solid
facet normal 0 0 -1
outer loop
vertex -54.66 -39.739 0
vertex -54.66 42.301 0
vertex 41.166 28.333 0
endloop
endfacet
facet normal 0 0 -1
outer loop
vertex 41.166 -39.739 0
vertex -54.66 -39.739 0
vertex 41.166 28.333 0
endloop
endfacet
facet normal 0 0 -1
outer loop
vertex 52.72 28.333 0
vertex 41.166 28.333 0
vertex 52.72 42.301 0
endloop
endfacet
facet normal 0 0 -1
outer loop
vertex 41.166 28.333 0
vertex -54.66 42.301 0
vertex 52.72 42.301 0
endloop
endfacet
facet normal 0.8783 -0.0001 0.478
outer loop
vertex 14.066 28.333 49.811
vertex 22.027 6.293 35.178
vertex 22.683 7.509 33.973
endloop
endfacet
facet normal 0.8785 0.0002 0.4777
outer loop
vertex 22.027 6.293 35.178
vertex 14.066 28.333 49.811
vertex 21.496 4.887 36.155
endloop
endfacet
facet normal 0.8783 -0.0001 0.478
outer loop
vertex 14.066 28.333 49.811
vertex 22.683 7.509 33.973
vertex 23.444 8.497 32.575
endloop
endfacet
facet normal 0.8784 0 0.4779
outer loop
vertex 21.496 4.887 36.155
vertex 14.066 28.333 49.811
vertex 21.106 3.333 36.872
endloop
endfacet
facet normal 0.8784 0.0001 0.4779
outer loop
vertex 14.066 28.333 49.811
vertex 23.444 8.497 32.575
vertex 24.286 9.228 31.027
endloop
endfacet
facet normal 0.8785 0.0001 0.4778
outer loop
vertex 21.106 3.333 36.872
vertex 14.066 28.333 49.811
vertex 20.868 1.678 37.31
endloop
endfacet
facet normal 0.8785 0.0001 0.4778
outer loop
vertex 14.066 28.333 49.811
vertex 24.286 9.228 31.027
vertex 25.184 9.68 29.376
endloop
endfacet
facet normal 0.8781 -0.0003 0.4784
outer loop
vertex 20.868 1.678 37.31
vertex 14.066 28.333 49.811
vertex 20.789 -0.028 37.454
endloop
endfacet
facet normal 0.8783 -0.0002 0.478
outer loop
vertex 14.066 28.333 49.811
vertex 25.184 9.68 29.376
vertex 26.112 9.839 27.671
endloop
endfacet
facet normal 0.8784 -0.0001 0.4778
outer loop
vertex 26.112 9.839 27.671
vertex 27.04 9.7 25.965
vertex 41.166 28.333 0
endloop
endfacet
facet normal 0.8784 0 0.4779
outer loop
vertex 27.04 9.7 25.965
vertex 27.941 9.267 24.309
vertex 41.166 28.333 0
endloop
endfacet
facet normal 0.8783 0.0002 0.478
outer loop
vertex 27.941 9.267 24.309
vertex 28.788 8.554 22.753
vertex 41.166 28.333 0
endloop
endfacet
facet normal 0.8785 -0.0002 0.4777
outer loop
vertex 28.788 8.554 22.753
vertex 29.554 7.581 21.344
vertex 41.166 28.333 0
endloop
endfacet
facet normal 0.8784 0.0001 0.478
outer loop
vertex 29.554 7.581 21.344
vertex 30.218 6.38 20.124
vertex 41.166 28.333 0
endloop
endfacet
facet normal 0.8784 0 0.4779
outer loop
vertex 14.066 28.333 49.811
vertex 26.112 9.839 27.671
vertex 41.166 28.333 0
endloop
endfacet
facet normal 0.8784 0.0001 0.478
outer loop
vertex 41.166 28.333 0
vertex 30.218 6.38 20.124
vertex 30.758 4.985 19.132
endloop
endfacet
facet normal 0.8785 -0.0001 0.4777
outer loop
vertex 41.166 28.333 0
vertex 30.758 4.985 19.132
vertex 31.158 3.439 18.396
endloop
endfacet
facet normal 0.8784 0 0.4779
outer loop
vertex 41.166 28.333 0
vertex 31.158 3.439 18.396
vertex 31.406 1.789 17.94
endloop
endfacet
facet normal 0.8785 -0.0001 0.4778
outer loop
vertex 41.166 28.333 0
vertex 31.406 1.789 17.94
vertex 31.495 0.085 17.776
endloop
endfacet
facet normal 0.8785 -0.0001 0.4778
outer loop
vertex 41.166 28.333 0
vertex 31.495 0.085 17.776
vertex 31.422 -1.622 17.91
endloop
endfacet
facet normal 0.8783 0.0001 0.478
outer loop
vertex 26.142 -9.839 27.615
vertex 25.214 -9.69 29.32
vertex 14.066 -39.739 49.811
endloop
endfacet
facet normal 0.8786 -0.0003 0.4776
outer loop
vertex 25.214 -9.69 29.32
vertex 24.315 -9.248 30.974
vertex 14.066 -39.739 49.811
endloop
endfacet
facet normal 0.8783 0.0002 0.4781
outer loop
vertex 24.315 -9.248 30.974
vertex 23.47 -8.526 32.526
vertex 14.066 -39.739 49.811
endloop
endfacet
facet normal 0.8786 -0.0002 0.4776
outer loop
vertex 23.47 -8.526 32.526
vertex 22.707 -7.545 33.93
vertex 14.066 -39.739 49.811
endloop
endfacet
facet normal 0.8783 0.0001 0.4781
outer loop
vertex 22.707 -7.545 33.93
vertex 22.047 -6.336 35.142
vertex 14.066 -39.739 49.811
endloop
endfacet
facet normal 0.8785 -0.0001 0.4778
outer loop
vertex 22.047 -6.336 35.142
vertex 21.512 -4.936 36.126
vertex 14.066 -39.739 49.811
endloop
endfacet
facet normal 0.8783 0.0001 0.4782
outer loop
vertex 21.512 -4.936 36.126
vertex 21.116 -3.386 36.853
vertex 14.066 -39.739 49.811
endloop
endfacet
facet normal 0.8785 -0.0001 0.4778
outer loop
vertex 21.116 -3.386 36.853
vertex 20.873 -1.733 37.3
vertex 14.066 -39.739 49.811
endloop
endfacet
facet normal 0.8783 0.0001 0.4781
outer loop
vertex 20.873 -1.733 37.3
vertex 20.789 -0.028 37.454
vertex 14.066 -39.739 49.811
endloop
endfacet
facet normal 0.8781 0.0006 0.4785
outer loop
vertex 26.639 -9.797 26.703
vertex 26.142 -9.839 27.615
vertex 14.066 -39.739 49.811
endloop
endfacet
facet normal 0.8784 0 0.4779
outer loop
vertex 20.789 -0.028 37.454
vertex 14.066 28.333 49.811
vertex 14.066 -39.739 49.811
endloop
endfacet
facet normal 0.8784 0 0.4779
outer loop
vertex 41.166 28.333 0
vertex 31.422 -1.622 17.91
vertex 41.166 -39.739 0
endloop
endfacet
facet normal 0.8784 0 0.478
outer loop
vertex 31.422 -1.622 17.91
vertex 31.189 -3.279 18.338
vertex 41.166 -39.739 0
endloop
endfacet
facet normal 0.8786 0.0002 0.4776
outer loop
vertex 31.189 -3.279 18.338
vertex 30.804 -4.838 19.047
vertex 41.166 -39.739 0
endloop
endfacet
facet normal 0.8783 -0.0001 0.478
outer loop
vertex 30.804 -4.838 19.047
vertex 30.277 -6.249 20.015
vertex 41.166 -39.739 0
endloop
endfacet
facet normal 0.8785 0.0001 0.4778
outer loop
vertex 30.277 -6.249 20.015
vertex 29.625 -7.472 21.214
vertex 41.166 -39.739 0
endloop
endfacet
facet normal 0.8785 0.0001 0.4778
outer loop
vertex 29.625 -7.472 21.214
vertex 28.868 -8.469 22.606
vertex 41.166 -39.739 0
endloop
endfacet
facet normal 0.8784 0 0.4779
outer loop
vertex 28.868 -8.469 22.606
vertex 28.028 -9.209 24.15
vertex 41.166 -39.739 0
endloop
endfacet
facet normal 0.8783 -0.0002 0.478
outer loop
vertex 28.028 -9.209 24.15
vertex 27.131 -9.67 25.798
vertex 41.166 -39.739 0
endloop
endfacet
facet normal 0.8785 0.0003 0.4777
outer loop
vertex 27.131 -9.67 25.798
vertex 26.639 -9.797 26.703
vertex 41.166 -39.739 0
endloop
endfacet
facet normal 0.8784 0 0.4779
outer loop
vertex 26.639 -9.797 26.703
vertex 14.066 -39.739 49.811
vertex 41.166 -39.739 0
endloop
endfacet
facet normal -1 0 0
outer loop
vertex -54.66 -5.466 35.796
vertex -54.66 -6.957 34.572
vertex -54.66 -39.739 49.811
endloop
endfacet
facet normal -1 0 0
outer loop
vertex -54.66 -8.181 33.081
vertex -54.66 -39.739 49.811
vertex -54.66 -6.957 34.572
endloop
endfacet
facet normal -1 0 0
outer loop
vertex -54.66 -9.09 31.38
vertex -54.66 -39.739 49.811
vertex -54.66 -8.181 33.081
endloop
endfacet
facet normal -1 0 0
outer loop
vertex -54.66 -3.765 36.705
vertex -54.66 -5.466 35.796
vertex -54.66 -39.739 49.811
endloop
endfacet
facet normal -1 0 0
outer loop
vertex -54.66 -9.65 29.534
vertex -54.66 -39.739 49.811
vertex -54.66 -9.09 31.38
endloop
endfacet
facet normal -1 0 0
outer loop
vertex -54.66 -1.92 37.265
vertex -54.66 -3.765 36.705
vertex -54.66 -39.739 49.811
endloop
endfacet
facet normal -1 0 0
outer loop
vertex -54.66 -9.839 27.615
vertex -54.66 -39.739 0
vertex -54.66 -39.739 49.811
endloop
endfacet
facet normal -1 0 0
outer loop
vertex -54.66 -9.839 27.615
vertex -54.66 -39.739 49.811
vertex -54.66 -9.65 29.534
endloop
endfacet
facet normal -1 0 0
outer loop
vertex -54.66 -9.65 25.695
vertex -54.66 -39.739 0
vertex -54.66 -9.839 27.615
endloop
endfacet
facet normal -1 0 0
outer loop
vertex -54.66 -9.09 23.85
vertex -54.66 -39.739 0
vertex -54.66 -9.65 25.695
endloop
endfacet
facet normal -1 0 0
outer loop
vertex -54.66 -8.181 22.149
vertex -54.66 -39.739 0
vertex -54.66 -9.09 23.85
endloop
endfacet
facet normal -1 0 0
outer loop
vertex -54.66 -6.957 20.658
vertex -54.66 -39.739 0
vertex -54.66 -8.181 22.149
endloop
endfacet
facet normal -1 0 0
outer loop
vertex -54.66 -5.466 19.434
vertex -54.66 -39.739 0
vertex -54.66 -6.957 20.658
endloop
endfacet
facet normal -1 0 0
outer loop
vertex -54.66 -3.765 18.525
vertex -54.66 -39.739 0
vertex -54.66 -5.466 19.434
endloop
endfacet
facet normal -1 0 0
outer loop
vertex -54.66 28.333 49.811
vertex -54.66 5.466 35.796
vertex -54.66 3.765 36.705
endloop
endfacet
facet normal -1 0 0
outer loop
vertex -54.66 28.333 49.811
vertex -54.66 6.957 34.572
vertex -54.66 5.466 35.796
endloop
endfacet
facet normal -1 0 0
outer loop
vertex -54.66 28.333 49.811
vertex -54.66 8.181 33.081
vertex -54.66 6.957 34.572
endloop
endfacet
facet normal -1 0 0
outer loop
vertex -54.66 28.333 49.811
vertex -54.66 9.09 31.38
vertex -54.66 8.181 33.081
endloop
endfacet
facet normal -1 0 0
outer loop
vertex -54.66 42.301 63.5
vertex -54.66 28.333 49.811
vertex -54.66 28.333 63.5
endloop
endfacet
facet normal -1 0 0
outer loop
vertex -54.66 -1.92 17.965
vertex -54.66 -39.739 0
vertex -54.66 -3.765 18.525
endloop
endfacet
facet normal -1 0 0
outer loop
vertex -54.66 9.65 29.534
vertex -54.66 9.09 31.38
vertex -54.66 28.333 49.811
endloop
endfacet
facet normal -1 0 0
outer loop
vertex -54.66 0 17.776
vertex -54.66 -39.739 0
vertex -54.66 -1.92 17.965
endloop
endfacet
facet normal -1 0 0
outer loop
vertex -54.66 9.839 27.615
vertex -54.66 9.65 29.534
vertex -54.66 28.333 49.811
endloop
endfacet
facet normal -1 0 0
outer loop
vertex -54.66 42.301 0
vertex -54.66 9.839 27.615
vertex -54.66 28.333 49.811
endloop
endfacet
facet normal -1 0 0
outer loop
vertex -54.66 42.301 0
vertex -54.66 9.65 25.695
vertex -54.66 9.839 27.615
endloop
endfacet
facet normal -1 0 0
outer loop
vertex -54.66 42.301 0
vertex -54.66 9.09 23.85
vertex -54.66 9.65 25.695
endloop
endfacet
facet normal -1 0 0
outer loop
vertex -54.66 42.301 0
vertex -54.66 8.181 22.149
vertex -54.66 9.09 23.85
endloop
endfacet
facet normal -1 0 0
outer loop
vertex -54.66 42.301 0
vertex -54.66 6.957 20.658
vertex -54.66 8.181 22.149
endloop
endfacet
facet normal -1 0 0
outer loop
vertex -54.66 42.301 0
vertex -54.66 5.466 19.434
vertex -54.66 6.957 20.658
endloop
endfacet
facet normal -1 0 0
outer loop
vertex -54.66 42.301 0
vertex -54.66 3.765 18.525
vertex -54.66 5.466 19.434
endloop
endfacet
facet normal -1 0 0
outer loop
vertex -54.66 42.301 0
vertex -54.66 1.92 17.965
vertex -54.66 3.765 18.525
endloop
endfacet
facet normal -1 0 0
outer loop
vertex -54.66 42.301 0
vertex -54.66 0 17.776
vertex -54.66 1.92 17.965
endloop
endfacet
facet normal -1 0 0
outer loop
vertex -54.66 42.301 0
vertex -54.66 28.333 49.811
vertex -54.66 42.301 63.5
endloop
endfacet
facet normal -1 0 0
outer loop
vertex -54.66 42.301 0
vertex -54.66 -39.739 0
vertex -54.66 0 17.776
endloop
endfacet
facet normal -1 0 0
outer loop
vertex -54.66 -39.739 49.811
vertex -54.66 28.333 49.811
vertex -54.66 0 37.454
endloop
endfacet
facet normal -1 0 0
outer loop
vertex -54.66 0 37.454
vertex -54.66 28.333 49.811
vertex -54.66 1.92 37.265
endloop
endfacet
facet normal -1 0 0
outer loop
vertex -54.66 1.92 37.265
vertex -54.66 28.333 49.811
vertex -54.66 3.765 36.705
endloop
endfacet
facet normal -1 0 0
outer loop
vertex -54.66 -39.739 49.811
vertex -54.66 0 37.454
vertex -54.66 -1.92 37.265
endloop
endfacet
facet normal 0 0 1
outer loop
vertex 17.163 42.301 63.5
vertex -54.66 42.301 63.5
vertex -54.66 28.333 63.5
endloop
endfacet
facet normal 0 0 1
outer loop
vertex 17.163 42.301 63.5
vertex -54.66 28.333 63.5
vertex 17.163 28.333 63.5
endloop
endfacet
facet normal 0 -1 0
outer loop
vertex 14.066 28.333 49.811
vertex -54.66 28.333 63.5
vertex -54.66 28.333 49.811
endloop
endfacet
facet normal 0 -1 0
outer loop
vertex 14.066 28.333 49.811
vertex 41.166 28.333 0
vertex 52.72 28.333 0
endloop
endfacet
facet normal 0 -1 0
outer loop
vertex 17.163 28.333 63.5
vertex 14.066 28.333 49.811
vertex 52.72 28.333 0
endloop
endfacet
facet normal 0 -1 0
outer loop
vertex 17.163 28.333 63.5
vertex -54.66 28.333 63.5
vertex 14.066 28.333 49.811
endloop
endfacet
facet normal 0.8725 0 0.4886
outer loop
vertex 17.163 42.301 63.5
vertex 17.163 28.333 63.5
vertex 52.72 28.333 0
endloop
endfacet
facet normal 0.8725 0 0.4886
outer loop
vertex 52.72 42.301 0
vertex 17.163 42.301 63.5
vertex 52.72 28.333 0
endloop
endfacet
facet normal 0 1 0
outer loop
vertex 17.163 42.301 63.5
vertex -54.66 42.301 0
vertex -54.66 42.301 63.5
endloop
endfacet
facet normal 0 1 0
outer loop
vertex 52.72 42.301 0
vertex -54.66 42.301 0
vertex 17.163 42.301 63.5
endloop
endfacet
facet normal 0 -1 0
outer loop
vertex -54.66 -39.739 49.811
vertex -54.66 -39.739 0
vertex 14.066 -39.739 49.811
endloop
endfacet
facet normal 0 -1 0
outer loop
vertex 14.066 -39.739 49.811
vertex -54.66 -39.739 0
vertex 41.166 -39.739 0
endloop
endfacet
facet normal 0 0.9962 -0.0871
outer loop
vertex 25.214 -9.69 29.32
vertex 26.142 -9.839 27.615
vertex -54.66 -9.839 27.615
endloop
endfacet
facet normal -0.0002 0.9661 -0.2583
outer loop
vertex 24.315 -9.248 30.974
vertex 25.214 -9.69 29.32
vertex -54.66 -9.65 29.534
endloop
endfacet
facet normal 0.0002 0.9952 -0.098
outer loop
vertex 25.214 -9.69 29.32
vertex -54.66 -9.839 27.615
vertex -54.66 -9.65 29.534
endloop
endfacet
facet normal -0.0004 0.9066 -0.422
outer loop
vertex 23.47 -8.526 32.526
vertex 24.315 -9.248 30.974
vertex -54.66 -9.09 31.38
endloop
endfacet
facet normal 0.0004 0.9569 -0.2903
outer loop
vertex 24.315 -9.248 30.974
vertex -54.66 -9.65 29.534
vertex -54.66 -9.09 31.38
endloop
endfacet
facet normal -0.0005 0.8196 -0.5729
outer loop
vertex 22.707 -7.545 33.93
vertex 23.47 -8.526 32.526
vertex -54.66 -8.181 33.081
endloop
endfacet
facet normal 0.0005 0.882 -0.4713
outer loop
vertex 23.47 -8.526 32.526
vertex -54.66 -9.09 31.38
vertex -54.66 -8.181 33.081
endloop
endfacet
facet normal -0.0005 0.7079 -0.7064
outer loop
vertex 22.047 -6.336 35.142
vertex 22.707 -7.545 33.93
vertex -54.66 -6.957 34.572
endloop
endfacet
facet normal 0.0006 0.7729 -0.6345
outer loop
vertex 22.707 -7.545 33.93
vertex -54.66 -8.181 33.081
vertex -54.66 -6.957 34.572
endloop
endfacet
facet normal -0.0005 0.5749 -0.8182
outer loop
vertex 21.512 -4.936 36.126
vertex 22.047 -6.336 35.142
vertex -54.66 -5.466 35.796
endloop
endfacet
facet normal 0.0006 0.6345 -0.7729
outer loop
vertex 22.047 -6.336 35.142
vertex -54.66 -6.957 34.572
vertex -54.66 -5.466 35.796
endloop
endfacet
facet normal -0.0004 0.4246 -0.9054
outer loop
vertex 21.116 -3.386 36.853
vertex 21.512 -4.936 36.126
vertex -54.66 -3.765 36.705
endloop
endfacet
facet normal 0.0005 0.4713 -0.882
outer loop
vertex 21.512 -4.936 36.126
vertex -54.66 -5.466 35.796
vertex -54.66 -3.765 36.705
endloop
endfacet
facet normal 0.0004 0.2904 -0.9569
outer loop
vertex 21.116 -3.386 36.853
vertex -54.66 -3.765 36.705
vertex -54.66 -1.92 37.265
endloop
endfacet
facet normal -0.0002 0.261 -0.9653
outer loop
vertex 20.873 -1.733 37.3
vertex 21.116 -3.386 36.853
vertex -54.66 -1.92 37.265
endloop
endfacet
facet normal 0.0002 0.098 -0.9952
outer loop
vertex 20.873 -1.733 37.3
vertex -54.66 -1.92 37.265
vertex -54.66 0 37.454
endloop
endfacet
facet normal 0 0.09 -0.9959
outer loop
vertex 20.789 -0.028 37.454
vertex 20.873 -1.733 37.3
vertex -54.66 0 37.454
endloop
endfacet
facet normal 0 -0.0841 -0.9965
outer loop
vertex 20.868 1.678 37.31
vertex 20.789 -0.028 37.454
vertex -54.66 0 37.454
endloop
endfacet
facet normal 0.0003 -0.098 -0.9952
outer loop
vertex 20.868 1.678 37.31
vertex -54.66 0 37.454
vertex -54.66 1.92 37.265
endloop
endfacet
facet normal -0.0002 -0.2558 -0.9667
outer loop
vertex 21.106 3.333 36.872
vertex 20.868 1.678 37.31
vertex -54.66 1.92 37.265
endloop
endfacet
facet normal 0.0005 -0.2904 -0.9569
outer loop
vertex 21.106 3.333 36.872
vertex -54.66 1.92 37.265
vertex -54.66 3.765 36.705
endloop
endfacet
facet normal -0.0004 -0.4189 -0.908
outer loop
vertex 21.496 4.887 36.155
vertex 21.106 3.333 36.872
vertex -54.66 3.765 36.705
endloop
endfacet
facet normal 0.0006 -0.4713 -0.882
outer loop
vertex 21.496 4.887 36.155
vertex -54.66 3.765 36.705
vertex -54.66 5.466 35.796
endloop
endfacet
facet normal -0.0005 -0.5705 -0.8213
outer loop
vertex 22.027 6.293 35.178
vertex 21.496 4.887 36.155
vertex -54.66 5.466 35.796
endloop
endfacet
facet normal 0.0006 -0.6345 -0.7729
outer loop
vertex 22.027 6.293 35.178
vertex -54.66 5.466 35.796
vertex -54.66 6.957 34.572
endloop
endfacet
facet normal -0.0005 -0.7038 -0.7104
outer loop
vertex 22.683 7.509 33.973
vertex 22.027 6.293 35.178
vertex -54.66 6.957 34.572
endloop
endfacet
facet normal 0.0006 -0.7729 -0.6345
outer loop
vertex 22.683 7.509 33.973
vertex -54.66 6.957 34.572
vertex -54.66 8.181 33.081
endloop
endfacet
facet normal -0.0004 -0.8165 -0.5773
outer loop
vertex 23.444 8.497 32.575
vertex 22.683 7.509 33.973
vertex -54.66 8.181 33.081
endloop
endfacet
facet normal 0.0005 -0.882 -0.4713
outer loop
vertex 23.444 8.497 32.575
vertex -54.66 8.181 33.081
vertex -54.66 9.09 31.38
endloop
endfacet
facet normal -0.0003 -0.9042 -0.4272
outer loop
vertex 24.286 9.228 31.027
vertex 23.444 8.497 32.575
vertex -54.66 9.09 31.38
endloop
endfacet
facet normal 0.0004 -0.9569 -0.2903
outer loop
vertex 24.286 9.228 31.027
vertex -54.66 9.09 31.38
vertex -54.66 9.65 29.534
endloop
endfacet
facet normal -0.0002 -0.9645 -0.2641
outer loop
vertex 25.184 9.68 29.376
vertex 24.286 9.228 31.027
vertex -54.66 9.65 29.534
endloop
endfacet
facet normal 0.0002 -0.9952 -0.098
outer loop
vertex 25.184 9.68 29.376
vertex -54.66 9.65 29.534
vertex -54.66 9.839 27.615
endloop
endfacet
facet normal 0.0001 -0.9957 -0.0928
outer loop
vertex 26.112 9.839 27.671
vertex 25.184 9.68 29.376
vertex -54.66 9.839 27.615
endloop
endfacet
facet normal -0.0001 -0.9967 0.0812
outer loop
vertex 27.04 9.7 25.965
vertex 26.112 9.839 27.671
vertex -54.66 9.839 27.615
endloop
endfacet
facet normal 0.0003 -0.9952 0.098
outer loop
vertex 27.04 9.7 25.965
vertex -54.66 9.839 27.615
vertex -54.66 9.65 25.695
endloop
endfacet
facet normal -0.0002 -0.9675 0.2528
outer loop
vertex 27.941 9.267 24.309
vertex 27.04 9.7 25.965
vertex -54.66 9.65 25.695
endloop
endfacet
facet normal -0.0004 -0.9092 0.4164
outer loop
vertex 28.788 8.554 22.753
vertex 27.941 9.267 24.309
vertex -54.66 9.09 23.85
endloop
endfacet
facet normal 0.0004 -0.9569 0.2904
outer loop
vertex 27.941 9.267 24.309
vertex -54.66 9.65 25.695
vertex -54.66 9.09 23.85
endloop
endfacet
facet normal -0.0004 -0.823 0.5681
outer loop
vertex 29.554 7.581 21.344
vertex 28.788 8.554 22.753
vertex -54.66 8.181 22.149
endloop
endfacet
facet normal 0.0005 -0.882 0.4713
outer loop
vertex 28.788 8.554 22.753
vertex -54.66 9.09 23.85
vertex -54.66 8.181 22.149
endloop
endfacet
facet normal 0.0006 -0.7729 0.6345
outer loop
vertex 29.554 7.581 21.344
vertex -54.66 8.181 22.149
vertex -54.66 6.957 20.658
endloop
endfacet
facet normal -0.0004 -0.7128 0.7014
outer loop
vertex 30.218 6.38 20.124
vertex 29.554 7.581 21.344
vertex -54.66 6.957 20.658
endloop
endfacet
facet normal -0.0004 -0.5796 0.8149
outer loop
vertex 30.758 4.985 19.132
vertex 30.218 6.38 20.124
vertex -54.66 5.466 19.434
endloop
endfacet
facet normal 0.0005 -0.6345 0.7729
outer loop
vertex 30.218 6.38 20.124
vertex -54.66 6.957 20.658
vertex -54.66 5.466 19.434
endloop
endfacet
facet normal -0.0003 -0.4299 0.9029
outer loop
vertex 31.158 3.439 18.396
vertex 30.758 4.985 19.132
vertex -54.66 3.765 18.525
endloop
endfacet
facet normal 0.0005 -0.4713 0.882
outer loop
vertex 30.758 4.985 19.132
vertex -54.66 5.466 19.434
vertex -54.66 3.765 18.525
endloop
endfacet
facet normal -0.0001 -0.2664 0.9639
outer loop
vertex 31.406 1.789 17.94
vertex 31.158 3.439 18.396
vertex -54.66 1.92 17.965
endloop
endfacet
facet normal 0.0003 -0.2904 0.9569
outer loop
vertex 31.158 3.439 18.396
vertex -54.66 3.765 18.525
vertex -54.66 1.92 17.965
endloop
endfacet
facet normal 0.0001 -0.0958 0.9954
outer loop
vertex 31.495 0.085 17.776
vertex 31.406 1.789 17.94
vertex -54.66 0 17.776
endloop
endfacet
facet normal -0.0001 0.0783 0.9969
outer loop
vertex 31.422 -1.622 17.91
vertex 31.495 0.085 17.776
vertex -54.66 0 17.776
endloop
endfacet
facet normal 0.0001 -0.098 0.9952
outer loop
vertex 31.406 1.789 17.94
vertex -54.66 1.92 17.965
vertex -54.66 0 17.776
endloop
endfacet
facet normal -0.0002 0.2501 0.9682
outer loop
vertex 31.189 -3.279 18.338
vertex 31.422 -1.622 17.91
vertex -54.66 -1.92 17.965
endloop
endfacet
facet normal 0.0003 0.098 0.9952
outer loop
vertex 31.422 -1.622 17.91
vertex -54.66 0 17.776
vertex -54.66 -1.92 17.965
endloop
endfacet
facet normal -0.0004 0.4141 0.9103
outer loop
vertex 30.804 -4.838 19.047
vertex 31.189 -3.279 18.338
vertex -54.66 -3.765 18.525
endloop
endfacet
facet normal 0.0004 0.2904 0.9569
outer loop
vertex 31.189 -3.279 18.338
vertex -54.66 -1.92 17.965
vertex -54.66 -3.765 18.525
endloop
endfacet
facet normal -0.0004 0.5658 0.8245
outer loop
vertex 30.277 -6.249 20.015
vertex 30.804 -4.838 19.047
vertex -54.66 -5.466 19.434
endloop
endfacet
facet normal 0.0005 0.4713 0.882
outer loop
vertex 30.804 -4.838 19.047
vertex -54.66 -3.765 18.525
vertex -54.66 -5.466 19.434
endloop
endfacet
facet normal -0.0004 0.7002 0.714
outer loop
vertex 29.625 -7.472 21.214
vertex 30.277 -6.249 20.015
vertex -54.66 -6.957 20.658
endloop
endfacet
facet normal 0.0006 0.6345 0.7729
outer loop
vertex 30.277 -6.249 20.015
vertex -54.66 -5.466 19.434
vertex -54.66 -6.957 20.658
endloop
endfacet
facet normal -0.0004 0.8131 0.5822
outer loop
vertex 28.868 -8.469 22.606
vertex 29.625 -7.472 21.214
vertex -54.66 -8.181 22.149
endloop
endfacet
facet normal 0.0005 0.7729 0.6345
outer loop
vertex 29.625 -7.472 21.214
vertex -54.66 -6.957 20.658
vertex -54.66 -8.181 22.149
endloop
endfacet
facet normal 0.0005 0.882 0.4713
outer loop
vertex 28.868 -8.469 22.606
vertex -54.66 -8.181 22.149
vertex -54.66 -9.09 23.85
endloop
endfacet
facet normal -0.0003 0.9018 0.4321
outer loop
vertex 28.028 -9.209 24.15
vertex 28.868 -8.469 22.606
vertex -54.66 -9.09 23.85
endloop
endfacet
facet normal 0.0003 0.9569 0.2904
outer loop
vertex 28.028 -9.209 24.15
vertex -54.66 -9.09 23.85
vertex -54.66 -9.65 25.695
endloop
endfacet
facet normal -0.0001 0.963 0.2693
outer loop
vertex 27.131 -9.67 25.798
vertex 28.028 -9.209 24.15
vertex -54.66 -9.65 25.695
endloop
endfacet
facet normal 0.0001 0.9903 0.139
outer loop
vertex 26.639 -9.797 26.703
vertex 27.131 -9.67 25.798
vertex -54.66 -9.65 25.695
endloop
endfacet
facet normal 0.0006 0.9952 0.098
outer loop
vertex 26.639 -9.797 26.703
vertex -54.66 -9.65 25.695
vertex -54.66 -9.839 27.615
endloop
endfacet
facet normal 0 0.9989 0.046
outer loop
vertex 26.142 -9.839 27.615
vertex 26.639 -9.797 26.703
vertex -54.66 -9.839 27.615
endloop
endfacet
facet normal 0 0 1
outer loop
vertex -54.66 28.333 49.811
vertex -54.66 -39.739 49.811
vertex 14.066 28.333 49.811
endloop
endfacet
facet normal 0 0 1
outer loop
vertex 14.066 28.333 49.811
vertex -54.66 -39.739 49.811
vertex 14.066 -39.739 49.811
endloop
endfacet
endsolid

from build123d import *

# Parameters (mm, degrees)
F0_W     = 107.3800772429
F0_H     = 82.039296627
F1_DEPTH = 63.5
F3_DEPTH = 82.040296627
F5_DEPTH = 68.072
F6_R     = 9.8390398468
F7_DEPTH = 107.3810772429


with BuildPart() as f1:
    # F0 (on Top) → F1 (new body)
    with BuildSketch(Plane.XY):
        with Locations((-0.9704492986, 1.2810640037)):
            Rectangle(F0_W, F0_H)
    extrude(amount=F1_DEPTH)

    # F2 (on face) → F3 (cut, through all)
    with BuildSketch(Plane.XZ.offset(39.7385843098)):
        Polygon((17.1634294093, 63.5), (52.7195893228, 0), (52.7195893228, 63.5), align=None)
    extrude(amount=-F3_DEPTH, mode=Mode.SUBTRACT)

    # F4 (on face) → F5 (cut)
    with BuildSketch(Plane.XZ.offset(39.7385843098)):
        Polygon((17.1634294093, 63.5), (-54.66048792, 63.5), (-54.66048792, 49.8112104833), (14.0662752092, 49.8112104833), (41.1664322019, 0), (52.7195893228, 0), align=None)
    extrude(amount=-F5_DEPTH, mode=Mode.SUBTRACT)

    # F6 (on face) → F7 (cut, through all)
    with BuildSketch(Plane(origin=(-54.66048792, 0, 0), x_dir=(0, -1, 0), z_dir=(-1, 0, 0))):
        with Locations((0, 27.6148878038)):
            Circle(F6_R)
    extrude(amount=-F7_DEPTH, mode=Mode.SUBTRACT)


solid = f1.part
